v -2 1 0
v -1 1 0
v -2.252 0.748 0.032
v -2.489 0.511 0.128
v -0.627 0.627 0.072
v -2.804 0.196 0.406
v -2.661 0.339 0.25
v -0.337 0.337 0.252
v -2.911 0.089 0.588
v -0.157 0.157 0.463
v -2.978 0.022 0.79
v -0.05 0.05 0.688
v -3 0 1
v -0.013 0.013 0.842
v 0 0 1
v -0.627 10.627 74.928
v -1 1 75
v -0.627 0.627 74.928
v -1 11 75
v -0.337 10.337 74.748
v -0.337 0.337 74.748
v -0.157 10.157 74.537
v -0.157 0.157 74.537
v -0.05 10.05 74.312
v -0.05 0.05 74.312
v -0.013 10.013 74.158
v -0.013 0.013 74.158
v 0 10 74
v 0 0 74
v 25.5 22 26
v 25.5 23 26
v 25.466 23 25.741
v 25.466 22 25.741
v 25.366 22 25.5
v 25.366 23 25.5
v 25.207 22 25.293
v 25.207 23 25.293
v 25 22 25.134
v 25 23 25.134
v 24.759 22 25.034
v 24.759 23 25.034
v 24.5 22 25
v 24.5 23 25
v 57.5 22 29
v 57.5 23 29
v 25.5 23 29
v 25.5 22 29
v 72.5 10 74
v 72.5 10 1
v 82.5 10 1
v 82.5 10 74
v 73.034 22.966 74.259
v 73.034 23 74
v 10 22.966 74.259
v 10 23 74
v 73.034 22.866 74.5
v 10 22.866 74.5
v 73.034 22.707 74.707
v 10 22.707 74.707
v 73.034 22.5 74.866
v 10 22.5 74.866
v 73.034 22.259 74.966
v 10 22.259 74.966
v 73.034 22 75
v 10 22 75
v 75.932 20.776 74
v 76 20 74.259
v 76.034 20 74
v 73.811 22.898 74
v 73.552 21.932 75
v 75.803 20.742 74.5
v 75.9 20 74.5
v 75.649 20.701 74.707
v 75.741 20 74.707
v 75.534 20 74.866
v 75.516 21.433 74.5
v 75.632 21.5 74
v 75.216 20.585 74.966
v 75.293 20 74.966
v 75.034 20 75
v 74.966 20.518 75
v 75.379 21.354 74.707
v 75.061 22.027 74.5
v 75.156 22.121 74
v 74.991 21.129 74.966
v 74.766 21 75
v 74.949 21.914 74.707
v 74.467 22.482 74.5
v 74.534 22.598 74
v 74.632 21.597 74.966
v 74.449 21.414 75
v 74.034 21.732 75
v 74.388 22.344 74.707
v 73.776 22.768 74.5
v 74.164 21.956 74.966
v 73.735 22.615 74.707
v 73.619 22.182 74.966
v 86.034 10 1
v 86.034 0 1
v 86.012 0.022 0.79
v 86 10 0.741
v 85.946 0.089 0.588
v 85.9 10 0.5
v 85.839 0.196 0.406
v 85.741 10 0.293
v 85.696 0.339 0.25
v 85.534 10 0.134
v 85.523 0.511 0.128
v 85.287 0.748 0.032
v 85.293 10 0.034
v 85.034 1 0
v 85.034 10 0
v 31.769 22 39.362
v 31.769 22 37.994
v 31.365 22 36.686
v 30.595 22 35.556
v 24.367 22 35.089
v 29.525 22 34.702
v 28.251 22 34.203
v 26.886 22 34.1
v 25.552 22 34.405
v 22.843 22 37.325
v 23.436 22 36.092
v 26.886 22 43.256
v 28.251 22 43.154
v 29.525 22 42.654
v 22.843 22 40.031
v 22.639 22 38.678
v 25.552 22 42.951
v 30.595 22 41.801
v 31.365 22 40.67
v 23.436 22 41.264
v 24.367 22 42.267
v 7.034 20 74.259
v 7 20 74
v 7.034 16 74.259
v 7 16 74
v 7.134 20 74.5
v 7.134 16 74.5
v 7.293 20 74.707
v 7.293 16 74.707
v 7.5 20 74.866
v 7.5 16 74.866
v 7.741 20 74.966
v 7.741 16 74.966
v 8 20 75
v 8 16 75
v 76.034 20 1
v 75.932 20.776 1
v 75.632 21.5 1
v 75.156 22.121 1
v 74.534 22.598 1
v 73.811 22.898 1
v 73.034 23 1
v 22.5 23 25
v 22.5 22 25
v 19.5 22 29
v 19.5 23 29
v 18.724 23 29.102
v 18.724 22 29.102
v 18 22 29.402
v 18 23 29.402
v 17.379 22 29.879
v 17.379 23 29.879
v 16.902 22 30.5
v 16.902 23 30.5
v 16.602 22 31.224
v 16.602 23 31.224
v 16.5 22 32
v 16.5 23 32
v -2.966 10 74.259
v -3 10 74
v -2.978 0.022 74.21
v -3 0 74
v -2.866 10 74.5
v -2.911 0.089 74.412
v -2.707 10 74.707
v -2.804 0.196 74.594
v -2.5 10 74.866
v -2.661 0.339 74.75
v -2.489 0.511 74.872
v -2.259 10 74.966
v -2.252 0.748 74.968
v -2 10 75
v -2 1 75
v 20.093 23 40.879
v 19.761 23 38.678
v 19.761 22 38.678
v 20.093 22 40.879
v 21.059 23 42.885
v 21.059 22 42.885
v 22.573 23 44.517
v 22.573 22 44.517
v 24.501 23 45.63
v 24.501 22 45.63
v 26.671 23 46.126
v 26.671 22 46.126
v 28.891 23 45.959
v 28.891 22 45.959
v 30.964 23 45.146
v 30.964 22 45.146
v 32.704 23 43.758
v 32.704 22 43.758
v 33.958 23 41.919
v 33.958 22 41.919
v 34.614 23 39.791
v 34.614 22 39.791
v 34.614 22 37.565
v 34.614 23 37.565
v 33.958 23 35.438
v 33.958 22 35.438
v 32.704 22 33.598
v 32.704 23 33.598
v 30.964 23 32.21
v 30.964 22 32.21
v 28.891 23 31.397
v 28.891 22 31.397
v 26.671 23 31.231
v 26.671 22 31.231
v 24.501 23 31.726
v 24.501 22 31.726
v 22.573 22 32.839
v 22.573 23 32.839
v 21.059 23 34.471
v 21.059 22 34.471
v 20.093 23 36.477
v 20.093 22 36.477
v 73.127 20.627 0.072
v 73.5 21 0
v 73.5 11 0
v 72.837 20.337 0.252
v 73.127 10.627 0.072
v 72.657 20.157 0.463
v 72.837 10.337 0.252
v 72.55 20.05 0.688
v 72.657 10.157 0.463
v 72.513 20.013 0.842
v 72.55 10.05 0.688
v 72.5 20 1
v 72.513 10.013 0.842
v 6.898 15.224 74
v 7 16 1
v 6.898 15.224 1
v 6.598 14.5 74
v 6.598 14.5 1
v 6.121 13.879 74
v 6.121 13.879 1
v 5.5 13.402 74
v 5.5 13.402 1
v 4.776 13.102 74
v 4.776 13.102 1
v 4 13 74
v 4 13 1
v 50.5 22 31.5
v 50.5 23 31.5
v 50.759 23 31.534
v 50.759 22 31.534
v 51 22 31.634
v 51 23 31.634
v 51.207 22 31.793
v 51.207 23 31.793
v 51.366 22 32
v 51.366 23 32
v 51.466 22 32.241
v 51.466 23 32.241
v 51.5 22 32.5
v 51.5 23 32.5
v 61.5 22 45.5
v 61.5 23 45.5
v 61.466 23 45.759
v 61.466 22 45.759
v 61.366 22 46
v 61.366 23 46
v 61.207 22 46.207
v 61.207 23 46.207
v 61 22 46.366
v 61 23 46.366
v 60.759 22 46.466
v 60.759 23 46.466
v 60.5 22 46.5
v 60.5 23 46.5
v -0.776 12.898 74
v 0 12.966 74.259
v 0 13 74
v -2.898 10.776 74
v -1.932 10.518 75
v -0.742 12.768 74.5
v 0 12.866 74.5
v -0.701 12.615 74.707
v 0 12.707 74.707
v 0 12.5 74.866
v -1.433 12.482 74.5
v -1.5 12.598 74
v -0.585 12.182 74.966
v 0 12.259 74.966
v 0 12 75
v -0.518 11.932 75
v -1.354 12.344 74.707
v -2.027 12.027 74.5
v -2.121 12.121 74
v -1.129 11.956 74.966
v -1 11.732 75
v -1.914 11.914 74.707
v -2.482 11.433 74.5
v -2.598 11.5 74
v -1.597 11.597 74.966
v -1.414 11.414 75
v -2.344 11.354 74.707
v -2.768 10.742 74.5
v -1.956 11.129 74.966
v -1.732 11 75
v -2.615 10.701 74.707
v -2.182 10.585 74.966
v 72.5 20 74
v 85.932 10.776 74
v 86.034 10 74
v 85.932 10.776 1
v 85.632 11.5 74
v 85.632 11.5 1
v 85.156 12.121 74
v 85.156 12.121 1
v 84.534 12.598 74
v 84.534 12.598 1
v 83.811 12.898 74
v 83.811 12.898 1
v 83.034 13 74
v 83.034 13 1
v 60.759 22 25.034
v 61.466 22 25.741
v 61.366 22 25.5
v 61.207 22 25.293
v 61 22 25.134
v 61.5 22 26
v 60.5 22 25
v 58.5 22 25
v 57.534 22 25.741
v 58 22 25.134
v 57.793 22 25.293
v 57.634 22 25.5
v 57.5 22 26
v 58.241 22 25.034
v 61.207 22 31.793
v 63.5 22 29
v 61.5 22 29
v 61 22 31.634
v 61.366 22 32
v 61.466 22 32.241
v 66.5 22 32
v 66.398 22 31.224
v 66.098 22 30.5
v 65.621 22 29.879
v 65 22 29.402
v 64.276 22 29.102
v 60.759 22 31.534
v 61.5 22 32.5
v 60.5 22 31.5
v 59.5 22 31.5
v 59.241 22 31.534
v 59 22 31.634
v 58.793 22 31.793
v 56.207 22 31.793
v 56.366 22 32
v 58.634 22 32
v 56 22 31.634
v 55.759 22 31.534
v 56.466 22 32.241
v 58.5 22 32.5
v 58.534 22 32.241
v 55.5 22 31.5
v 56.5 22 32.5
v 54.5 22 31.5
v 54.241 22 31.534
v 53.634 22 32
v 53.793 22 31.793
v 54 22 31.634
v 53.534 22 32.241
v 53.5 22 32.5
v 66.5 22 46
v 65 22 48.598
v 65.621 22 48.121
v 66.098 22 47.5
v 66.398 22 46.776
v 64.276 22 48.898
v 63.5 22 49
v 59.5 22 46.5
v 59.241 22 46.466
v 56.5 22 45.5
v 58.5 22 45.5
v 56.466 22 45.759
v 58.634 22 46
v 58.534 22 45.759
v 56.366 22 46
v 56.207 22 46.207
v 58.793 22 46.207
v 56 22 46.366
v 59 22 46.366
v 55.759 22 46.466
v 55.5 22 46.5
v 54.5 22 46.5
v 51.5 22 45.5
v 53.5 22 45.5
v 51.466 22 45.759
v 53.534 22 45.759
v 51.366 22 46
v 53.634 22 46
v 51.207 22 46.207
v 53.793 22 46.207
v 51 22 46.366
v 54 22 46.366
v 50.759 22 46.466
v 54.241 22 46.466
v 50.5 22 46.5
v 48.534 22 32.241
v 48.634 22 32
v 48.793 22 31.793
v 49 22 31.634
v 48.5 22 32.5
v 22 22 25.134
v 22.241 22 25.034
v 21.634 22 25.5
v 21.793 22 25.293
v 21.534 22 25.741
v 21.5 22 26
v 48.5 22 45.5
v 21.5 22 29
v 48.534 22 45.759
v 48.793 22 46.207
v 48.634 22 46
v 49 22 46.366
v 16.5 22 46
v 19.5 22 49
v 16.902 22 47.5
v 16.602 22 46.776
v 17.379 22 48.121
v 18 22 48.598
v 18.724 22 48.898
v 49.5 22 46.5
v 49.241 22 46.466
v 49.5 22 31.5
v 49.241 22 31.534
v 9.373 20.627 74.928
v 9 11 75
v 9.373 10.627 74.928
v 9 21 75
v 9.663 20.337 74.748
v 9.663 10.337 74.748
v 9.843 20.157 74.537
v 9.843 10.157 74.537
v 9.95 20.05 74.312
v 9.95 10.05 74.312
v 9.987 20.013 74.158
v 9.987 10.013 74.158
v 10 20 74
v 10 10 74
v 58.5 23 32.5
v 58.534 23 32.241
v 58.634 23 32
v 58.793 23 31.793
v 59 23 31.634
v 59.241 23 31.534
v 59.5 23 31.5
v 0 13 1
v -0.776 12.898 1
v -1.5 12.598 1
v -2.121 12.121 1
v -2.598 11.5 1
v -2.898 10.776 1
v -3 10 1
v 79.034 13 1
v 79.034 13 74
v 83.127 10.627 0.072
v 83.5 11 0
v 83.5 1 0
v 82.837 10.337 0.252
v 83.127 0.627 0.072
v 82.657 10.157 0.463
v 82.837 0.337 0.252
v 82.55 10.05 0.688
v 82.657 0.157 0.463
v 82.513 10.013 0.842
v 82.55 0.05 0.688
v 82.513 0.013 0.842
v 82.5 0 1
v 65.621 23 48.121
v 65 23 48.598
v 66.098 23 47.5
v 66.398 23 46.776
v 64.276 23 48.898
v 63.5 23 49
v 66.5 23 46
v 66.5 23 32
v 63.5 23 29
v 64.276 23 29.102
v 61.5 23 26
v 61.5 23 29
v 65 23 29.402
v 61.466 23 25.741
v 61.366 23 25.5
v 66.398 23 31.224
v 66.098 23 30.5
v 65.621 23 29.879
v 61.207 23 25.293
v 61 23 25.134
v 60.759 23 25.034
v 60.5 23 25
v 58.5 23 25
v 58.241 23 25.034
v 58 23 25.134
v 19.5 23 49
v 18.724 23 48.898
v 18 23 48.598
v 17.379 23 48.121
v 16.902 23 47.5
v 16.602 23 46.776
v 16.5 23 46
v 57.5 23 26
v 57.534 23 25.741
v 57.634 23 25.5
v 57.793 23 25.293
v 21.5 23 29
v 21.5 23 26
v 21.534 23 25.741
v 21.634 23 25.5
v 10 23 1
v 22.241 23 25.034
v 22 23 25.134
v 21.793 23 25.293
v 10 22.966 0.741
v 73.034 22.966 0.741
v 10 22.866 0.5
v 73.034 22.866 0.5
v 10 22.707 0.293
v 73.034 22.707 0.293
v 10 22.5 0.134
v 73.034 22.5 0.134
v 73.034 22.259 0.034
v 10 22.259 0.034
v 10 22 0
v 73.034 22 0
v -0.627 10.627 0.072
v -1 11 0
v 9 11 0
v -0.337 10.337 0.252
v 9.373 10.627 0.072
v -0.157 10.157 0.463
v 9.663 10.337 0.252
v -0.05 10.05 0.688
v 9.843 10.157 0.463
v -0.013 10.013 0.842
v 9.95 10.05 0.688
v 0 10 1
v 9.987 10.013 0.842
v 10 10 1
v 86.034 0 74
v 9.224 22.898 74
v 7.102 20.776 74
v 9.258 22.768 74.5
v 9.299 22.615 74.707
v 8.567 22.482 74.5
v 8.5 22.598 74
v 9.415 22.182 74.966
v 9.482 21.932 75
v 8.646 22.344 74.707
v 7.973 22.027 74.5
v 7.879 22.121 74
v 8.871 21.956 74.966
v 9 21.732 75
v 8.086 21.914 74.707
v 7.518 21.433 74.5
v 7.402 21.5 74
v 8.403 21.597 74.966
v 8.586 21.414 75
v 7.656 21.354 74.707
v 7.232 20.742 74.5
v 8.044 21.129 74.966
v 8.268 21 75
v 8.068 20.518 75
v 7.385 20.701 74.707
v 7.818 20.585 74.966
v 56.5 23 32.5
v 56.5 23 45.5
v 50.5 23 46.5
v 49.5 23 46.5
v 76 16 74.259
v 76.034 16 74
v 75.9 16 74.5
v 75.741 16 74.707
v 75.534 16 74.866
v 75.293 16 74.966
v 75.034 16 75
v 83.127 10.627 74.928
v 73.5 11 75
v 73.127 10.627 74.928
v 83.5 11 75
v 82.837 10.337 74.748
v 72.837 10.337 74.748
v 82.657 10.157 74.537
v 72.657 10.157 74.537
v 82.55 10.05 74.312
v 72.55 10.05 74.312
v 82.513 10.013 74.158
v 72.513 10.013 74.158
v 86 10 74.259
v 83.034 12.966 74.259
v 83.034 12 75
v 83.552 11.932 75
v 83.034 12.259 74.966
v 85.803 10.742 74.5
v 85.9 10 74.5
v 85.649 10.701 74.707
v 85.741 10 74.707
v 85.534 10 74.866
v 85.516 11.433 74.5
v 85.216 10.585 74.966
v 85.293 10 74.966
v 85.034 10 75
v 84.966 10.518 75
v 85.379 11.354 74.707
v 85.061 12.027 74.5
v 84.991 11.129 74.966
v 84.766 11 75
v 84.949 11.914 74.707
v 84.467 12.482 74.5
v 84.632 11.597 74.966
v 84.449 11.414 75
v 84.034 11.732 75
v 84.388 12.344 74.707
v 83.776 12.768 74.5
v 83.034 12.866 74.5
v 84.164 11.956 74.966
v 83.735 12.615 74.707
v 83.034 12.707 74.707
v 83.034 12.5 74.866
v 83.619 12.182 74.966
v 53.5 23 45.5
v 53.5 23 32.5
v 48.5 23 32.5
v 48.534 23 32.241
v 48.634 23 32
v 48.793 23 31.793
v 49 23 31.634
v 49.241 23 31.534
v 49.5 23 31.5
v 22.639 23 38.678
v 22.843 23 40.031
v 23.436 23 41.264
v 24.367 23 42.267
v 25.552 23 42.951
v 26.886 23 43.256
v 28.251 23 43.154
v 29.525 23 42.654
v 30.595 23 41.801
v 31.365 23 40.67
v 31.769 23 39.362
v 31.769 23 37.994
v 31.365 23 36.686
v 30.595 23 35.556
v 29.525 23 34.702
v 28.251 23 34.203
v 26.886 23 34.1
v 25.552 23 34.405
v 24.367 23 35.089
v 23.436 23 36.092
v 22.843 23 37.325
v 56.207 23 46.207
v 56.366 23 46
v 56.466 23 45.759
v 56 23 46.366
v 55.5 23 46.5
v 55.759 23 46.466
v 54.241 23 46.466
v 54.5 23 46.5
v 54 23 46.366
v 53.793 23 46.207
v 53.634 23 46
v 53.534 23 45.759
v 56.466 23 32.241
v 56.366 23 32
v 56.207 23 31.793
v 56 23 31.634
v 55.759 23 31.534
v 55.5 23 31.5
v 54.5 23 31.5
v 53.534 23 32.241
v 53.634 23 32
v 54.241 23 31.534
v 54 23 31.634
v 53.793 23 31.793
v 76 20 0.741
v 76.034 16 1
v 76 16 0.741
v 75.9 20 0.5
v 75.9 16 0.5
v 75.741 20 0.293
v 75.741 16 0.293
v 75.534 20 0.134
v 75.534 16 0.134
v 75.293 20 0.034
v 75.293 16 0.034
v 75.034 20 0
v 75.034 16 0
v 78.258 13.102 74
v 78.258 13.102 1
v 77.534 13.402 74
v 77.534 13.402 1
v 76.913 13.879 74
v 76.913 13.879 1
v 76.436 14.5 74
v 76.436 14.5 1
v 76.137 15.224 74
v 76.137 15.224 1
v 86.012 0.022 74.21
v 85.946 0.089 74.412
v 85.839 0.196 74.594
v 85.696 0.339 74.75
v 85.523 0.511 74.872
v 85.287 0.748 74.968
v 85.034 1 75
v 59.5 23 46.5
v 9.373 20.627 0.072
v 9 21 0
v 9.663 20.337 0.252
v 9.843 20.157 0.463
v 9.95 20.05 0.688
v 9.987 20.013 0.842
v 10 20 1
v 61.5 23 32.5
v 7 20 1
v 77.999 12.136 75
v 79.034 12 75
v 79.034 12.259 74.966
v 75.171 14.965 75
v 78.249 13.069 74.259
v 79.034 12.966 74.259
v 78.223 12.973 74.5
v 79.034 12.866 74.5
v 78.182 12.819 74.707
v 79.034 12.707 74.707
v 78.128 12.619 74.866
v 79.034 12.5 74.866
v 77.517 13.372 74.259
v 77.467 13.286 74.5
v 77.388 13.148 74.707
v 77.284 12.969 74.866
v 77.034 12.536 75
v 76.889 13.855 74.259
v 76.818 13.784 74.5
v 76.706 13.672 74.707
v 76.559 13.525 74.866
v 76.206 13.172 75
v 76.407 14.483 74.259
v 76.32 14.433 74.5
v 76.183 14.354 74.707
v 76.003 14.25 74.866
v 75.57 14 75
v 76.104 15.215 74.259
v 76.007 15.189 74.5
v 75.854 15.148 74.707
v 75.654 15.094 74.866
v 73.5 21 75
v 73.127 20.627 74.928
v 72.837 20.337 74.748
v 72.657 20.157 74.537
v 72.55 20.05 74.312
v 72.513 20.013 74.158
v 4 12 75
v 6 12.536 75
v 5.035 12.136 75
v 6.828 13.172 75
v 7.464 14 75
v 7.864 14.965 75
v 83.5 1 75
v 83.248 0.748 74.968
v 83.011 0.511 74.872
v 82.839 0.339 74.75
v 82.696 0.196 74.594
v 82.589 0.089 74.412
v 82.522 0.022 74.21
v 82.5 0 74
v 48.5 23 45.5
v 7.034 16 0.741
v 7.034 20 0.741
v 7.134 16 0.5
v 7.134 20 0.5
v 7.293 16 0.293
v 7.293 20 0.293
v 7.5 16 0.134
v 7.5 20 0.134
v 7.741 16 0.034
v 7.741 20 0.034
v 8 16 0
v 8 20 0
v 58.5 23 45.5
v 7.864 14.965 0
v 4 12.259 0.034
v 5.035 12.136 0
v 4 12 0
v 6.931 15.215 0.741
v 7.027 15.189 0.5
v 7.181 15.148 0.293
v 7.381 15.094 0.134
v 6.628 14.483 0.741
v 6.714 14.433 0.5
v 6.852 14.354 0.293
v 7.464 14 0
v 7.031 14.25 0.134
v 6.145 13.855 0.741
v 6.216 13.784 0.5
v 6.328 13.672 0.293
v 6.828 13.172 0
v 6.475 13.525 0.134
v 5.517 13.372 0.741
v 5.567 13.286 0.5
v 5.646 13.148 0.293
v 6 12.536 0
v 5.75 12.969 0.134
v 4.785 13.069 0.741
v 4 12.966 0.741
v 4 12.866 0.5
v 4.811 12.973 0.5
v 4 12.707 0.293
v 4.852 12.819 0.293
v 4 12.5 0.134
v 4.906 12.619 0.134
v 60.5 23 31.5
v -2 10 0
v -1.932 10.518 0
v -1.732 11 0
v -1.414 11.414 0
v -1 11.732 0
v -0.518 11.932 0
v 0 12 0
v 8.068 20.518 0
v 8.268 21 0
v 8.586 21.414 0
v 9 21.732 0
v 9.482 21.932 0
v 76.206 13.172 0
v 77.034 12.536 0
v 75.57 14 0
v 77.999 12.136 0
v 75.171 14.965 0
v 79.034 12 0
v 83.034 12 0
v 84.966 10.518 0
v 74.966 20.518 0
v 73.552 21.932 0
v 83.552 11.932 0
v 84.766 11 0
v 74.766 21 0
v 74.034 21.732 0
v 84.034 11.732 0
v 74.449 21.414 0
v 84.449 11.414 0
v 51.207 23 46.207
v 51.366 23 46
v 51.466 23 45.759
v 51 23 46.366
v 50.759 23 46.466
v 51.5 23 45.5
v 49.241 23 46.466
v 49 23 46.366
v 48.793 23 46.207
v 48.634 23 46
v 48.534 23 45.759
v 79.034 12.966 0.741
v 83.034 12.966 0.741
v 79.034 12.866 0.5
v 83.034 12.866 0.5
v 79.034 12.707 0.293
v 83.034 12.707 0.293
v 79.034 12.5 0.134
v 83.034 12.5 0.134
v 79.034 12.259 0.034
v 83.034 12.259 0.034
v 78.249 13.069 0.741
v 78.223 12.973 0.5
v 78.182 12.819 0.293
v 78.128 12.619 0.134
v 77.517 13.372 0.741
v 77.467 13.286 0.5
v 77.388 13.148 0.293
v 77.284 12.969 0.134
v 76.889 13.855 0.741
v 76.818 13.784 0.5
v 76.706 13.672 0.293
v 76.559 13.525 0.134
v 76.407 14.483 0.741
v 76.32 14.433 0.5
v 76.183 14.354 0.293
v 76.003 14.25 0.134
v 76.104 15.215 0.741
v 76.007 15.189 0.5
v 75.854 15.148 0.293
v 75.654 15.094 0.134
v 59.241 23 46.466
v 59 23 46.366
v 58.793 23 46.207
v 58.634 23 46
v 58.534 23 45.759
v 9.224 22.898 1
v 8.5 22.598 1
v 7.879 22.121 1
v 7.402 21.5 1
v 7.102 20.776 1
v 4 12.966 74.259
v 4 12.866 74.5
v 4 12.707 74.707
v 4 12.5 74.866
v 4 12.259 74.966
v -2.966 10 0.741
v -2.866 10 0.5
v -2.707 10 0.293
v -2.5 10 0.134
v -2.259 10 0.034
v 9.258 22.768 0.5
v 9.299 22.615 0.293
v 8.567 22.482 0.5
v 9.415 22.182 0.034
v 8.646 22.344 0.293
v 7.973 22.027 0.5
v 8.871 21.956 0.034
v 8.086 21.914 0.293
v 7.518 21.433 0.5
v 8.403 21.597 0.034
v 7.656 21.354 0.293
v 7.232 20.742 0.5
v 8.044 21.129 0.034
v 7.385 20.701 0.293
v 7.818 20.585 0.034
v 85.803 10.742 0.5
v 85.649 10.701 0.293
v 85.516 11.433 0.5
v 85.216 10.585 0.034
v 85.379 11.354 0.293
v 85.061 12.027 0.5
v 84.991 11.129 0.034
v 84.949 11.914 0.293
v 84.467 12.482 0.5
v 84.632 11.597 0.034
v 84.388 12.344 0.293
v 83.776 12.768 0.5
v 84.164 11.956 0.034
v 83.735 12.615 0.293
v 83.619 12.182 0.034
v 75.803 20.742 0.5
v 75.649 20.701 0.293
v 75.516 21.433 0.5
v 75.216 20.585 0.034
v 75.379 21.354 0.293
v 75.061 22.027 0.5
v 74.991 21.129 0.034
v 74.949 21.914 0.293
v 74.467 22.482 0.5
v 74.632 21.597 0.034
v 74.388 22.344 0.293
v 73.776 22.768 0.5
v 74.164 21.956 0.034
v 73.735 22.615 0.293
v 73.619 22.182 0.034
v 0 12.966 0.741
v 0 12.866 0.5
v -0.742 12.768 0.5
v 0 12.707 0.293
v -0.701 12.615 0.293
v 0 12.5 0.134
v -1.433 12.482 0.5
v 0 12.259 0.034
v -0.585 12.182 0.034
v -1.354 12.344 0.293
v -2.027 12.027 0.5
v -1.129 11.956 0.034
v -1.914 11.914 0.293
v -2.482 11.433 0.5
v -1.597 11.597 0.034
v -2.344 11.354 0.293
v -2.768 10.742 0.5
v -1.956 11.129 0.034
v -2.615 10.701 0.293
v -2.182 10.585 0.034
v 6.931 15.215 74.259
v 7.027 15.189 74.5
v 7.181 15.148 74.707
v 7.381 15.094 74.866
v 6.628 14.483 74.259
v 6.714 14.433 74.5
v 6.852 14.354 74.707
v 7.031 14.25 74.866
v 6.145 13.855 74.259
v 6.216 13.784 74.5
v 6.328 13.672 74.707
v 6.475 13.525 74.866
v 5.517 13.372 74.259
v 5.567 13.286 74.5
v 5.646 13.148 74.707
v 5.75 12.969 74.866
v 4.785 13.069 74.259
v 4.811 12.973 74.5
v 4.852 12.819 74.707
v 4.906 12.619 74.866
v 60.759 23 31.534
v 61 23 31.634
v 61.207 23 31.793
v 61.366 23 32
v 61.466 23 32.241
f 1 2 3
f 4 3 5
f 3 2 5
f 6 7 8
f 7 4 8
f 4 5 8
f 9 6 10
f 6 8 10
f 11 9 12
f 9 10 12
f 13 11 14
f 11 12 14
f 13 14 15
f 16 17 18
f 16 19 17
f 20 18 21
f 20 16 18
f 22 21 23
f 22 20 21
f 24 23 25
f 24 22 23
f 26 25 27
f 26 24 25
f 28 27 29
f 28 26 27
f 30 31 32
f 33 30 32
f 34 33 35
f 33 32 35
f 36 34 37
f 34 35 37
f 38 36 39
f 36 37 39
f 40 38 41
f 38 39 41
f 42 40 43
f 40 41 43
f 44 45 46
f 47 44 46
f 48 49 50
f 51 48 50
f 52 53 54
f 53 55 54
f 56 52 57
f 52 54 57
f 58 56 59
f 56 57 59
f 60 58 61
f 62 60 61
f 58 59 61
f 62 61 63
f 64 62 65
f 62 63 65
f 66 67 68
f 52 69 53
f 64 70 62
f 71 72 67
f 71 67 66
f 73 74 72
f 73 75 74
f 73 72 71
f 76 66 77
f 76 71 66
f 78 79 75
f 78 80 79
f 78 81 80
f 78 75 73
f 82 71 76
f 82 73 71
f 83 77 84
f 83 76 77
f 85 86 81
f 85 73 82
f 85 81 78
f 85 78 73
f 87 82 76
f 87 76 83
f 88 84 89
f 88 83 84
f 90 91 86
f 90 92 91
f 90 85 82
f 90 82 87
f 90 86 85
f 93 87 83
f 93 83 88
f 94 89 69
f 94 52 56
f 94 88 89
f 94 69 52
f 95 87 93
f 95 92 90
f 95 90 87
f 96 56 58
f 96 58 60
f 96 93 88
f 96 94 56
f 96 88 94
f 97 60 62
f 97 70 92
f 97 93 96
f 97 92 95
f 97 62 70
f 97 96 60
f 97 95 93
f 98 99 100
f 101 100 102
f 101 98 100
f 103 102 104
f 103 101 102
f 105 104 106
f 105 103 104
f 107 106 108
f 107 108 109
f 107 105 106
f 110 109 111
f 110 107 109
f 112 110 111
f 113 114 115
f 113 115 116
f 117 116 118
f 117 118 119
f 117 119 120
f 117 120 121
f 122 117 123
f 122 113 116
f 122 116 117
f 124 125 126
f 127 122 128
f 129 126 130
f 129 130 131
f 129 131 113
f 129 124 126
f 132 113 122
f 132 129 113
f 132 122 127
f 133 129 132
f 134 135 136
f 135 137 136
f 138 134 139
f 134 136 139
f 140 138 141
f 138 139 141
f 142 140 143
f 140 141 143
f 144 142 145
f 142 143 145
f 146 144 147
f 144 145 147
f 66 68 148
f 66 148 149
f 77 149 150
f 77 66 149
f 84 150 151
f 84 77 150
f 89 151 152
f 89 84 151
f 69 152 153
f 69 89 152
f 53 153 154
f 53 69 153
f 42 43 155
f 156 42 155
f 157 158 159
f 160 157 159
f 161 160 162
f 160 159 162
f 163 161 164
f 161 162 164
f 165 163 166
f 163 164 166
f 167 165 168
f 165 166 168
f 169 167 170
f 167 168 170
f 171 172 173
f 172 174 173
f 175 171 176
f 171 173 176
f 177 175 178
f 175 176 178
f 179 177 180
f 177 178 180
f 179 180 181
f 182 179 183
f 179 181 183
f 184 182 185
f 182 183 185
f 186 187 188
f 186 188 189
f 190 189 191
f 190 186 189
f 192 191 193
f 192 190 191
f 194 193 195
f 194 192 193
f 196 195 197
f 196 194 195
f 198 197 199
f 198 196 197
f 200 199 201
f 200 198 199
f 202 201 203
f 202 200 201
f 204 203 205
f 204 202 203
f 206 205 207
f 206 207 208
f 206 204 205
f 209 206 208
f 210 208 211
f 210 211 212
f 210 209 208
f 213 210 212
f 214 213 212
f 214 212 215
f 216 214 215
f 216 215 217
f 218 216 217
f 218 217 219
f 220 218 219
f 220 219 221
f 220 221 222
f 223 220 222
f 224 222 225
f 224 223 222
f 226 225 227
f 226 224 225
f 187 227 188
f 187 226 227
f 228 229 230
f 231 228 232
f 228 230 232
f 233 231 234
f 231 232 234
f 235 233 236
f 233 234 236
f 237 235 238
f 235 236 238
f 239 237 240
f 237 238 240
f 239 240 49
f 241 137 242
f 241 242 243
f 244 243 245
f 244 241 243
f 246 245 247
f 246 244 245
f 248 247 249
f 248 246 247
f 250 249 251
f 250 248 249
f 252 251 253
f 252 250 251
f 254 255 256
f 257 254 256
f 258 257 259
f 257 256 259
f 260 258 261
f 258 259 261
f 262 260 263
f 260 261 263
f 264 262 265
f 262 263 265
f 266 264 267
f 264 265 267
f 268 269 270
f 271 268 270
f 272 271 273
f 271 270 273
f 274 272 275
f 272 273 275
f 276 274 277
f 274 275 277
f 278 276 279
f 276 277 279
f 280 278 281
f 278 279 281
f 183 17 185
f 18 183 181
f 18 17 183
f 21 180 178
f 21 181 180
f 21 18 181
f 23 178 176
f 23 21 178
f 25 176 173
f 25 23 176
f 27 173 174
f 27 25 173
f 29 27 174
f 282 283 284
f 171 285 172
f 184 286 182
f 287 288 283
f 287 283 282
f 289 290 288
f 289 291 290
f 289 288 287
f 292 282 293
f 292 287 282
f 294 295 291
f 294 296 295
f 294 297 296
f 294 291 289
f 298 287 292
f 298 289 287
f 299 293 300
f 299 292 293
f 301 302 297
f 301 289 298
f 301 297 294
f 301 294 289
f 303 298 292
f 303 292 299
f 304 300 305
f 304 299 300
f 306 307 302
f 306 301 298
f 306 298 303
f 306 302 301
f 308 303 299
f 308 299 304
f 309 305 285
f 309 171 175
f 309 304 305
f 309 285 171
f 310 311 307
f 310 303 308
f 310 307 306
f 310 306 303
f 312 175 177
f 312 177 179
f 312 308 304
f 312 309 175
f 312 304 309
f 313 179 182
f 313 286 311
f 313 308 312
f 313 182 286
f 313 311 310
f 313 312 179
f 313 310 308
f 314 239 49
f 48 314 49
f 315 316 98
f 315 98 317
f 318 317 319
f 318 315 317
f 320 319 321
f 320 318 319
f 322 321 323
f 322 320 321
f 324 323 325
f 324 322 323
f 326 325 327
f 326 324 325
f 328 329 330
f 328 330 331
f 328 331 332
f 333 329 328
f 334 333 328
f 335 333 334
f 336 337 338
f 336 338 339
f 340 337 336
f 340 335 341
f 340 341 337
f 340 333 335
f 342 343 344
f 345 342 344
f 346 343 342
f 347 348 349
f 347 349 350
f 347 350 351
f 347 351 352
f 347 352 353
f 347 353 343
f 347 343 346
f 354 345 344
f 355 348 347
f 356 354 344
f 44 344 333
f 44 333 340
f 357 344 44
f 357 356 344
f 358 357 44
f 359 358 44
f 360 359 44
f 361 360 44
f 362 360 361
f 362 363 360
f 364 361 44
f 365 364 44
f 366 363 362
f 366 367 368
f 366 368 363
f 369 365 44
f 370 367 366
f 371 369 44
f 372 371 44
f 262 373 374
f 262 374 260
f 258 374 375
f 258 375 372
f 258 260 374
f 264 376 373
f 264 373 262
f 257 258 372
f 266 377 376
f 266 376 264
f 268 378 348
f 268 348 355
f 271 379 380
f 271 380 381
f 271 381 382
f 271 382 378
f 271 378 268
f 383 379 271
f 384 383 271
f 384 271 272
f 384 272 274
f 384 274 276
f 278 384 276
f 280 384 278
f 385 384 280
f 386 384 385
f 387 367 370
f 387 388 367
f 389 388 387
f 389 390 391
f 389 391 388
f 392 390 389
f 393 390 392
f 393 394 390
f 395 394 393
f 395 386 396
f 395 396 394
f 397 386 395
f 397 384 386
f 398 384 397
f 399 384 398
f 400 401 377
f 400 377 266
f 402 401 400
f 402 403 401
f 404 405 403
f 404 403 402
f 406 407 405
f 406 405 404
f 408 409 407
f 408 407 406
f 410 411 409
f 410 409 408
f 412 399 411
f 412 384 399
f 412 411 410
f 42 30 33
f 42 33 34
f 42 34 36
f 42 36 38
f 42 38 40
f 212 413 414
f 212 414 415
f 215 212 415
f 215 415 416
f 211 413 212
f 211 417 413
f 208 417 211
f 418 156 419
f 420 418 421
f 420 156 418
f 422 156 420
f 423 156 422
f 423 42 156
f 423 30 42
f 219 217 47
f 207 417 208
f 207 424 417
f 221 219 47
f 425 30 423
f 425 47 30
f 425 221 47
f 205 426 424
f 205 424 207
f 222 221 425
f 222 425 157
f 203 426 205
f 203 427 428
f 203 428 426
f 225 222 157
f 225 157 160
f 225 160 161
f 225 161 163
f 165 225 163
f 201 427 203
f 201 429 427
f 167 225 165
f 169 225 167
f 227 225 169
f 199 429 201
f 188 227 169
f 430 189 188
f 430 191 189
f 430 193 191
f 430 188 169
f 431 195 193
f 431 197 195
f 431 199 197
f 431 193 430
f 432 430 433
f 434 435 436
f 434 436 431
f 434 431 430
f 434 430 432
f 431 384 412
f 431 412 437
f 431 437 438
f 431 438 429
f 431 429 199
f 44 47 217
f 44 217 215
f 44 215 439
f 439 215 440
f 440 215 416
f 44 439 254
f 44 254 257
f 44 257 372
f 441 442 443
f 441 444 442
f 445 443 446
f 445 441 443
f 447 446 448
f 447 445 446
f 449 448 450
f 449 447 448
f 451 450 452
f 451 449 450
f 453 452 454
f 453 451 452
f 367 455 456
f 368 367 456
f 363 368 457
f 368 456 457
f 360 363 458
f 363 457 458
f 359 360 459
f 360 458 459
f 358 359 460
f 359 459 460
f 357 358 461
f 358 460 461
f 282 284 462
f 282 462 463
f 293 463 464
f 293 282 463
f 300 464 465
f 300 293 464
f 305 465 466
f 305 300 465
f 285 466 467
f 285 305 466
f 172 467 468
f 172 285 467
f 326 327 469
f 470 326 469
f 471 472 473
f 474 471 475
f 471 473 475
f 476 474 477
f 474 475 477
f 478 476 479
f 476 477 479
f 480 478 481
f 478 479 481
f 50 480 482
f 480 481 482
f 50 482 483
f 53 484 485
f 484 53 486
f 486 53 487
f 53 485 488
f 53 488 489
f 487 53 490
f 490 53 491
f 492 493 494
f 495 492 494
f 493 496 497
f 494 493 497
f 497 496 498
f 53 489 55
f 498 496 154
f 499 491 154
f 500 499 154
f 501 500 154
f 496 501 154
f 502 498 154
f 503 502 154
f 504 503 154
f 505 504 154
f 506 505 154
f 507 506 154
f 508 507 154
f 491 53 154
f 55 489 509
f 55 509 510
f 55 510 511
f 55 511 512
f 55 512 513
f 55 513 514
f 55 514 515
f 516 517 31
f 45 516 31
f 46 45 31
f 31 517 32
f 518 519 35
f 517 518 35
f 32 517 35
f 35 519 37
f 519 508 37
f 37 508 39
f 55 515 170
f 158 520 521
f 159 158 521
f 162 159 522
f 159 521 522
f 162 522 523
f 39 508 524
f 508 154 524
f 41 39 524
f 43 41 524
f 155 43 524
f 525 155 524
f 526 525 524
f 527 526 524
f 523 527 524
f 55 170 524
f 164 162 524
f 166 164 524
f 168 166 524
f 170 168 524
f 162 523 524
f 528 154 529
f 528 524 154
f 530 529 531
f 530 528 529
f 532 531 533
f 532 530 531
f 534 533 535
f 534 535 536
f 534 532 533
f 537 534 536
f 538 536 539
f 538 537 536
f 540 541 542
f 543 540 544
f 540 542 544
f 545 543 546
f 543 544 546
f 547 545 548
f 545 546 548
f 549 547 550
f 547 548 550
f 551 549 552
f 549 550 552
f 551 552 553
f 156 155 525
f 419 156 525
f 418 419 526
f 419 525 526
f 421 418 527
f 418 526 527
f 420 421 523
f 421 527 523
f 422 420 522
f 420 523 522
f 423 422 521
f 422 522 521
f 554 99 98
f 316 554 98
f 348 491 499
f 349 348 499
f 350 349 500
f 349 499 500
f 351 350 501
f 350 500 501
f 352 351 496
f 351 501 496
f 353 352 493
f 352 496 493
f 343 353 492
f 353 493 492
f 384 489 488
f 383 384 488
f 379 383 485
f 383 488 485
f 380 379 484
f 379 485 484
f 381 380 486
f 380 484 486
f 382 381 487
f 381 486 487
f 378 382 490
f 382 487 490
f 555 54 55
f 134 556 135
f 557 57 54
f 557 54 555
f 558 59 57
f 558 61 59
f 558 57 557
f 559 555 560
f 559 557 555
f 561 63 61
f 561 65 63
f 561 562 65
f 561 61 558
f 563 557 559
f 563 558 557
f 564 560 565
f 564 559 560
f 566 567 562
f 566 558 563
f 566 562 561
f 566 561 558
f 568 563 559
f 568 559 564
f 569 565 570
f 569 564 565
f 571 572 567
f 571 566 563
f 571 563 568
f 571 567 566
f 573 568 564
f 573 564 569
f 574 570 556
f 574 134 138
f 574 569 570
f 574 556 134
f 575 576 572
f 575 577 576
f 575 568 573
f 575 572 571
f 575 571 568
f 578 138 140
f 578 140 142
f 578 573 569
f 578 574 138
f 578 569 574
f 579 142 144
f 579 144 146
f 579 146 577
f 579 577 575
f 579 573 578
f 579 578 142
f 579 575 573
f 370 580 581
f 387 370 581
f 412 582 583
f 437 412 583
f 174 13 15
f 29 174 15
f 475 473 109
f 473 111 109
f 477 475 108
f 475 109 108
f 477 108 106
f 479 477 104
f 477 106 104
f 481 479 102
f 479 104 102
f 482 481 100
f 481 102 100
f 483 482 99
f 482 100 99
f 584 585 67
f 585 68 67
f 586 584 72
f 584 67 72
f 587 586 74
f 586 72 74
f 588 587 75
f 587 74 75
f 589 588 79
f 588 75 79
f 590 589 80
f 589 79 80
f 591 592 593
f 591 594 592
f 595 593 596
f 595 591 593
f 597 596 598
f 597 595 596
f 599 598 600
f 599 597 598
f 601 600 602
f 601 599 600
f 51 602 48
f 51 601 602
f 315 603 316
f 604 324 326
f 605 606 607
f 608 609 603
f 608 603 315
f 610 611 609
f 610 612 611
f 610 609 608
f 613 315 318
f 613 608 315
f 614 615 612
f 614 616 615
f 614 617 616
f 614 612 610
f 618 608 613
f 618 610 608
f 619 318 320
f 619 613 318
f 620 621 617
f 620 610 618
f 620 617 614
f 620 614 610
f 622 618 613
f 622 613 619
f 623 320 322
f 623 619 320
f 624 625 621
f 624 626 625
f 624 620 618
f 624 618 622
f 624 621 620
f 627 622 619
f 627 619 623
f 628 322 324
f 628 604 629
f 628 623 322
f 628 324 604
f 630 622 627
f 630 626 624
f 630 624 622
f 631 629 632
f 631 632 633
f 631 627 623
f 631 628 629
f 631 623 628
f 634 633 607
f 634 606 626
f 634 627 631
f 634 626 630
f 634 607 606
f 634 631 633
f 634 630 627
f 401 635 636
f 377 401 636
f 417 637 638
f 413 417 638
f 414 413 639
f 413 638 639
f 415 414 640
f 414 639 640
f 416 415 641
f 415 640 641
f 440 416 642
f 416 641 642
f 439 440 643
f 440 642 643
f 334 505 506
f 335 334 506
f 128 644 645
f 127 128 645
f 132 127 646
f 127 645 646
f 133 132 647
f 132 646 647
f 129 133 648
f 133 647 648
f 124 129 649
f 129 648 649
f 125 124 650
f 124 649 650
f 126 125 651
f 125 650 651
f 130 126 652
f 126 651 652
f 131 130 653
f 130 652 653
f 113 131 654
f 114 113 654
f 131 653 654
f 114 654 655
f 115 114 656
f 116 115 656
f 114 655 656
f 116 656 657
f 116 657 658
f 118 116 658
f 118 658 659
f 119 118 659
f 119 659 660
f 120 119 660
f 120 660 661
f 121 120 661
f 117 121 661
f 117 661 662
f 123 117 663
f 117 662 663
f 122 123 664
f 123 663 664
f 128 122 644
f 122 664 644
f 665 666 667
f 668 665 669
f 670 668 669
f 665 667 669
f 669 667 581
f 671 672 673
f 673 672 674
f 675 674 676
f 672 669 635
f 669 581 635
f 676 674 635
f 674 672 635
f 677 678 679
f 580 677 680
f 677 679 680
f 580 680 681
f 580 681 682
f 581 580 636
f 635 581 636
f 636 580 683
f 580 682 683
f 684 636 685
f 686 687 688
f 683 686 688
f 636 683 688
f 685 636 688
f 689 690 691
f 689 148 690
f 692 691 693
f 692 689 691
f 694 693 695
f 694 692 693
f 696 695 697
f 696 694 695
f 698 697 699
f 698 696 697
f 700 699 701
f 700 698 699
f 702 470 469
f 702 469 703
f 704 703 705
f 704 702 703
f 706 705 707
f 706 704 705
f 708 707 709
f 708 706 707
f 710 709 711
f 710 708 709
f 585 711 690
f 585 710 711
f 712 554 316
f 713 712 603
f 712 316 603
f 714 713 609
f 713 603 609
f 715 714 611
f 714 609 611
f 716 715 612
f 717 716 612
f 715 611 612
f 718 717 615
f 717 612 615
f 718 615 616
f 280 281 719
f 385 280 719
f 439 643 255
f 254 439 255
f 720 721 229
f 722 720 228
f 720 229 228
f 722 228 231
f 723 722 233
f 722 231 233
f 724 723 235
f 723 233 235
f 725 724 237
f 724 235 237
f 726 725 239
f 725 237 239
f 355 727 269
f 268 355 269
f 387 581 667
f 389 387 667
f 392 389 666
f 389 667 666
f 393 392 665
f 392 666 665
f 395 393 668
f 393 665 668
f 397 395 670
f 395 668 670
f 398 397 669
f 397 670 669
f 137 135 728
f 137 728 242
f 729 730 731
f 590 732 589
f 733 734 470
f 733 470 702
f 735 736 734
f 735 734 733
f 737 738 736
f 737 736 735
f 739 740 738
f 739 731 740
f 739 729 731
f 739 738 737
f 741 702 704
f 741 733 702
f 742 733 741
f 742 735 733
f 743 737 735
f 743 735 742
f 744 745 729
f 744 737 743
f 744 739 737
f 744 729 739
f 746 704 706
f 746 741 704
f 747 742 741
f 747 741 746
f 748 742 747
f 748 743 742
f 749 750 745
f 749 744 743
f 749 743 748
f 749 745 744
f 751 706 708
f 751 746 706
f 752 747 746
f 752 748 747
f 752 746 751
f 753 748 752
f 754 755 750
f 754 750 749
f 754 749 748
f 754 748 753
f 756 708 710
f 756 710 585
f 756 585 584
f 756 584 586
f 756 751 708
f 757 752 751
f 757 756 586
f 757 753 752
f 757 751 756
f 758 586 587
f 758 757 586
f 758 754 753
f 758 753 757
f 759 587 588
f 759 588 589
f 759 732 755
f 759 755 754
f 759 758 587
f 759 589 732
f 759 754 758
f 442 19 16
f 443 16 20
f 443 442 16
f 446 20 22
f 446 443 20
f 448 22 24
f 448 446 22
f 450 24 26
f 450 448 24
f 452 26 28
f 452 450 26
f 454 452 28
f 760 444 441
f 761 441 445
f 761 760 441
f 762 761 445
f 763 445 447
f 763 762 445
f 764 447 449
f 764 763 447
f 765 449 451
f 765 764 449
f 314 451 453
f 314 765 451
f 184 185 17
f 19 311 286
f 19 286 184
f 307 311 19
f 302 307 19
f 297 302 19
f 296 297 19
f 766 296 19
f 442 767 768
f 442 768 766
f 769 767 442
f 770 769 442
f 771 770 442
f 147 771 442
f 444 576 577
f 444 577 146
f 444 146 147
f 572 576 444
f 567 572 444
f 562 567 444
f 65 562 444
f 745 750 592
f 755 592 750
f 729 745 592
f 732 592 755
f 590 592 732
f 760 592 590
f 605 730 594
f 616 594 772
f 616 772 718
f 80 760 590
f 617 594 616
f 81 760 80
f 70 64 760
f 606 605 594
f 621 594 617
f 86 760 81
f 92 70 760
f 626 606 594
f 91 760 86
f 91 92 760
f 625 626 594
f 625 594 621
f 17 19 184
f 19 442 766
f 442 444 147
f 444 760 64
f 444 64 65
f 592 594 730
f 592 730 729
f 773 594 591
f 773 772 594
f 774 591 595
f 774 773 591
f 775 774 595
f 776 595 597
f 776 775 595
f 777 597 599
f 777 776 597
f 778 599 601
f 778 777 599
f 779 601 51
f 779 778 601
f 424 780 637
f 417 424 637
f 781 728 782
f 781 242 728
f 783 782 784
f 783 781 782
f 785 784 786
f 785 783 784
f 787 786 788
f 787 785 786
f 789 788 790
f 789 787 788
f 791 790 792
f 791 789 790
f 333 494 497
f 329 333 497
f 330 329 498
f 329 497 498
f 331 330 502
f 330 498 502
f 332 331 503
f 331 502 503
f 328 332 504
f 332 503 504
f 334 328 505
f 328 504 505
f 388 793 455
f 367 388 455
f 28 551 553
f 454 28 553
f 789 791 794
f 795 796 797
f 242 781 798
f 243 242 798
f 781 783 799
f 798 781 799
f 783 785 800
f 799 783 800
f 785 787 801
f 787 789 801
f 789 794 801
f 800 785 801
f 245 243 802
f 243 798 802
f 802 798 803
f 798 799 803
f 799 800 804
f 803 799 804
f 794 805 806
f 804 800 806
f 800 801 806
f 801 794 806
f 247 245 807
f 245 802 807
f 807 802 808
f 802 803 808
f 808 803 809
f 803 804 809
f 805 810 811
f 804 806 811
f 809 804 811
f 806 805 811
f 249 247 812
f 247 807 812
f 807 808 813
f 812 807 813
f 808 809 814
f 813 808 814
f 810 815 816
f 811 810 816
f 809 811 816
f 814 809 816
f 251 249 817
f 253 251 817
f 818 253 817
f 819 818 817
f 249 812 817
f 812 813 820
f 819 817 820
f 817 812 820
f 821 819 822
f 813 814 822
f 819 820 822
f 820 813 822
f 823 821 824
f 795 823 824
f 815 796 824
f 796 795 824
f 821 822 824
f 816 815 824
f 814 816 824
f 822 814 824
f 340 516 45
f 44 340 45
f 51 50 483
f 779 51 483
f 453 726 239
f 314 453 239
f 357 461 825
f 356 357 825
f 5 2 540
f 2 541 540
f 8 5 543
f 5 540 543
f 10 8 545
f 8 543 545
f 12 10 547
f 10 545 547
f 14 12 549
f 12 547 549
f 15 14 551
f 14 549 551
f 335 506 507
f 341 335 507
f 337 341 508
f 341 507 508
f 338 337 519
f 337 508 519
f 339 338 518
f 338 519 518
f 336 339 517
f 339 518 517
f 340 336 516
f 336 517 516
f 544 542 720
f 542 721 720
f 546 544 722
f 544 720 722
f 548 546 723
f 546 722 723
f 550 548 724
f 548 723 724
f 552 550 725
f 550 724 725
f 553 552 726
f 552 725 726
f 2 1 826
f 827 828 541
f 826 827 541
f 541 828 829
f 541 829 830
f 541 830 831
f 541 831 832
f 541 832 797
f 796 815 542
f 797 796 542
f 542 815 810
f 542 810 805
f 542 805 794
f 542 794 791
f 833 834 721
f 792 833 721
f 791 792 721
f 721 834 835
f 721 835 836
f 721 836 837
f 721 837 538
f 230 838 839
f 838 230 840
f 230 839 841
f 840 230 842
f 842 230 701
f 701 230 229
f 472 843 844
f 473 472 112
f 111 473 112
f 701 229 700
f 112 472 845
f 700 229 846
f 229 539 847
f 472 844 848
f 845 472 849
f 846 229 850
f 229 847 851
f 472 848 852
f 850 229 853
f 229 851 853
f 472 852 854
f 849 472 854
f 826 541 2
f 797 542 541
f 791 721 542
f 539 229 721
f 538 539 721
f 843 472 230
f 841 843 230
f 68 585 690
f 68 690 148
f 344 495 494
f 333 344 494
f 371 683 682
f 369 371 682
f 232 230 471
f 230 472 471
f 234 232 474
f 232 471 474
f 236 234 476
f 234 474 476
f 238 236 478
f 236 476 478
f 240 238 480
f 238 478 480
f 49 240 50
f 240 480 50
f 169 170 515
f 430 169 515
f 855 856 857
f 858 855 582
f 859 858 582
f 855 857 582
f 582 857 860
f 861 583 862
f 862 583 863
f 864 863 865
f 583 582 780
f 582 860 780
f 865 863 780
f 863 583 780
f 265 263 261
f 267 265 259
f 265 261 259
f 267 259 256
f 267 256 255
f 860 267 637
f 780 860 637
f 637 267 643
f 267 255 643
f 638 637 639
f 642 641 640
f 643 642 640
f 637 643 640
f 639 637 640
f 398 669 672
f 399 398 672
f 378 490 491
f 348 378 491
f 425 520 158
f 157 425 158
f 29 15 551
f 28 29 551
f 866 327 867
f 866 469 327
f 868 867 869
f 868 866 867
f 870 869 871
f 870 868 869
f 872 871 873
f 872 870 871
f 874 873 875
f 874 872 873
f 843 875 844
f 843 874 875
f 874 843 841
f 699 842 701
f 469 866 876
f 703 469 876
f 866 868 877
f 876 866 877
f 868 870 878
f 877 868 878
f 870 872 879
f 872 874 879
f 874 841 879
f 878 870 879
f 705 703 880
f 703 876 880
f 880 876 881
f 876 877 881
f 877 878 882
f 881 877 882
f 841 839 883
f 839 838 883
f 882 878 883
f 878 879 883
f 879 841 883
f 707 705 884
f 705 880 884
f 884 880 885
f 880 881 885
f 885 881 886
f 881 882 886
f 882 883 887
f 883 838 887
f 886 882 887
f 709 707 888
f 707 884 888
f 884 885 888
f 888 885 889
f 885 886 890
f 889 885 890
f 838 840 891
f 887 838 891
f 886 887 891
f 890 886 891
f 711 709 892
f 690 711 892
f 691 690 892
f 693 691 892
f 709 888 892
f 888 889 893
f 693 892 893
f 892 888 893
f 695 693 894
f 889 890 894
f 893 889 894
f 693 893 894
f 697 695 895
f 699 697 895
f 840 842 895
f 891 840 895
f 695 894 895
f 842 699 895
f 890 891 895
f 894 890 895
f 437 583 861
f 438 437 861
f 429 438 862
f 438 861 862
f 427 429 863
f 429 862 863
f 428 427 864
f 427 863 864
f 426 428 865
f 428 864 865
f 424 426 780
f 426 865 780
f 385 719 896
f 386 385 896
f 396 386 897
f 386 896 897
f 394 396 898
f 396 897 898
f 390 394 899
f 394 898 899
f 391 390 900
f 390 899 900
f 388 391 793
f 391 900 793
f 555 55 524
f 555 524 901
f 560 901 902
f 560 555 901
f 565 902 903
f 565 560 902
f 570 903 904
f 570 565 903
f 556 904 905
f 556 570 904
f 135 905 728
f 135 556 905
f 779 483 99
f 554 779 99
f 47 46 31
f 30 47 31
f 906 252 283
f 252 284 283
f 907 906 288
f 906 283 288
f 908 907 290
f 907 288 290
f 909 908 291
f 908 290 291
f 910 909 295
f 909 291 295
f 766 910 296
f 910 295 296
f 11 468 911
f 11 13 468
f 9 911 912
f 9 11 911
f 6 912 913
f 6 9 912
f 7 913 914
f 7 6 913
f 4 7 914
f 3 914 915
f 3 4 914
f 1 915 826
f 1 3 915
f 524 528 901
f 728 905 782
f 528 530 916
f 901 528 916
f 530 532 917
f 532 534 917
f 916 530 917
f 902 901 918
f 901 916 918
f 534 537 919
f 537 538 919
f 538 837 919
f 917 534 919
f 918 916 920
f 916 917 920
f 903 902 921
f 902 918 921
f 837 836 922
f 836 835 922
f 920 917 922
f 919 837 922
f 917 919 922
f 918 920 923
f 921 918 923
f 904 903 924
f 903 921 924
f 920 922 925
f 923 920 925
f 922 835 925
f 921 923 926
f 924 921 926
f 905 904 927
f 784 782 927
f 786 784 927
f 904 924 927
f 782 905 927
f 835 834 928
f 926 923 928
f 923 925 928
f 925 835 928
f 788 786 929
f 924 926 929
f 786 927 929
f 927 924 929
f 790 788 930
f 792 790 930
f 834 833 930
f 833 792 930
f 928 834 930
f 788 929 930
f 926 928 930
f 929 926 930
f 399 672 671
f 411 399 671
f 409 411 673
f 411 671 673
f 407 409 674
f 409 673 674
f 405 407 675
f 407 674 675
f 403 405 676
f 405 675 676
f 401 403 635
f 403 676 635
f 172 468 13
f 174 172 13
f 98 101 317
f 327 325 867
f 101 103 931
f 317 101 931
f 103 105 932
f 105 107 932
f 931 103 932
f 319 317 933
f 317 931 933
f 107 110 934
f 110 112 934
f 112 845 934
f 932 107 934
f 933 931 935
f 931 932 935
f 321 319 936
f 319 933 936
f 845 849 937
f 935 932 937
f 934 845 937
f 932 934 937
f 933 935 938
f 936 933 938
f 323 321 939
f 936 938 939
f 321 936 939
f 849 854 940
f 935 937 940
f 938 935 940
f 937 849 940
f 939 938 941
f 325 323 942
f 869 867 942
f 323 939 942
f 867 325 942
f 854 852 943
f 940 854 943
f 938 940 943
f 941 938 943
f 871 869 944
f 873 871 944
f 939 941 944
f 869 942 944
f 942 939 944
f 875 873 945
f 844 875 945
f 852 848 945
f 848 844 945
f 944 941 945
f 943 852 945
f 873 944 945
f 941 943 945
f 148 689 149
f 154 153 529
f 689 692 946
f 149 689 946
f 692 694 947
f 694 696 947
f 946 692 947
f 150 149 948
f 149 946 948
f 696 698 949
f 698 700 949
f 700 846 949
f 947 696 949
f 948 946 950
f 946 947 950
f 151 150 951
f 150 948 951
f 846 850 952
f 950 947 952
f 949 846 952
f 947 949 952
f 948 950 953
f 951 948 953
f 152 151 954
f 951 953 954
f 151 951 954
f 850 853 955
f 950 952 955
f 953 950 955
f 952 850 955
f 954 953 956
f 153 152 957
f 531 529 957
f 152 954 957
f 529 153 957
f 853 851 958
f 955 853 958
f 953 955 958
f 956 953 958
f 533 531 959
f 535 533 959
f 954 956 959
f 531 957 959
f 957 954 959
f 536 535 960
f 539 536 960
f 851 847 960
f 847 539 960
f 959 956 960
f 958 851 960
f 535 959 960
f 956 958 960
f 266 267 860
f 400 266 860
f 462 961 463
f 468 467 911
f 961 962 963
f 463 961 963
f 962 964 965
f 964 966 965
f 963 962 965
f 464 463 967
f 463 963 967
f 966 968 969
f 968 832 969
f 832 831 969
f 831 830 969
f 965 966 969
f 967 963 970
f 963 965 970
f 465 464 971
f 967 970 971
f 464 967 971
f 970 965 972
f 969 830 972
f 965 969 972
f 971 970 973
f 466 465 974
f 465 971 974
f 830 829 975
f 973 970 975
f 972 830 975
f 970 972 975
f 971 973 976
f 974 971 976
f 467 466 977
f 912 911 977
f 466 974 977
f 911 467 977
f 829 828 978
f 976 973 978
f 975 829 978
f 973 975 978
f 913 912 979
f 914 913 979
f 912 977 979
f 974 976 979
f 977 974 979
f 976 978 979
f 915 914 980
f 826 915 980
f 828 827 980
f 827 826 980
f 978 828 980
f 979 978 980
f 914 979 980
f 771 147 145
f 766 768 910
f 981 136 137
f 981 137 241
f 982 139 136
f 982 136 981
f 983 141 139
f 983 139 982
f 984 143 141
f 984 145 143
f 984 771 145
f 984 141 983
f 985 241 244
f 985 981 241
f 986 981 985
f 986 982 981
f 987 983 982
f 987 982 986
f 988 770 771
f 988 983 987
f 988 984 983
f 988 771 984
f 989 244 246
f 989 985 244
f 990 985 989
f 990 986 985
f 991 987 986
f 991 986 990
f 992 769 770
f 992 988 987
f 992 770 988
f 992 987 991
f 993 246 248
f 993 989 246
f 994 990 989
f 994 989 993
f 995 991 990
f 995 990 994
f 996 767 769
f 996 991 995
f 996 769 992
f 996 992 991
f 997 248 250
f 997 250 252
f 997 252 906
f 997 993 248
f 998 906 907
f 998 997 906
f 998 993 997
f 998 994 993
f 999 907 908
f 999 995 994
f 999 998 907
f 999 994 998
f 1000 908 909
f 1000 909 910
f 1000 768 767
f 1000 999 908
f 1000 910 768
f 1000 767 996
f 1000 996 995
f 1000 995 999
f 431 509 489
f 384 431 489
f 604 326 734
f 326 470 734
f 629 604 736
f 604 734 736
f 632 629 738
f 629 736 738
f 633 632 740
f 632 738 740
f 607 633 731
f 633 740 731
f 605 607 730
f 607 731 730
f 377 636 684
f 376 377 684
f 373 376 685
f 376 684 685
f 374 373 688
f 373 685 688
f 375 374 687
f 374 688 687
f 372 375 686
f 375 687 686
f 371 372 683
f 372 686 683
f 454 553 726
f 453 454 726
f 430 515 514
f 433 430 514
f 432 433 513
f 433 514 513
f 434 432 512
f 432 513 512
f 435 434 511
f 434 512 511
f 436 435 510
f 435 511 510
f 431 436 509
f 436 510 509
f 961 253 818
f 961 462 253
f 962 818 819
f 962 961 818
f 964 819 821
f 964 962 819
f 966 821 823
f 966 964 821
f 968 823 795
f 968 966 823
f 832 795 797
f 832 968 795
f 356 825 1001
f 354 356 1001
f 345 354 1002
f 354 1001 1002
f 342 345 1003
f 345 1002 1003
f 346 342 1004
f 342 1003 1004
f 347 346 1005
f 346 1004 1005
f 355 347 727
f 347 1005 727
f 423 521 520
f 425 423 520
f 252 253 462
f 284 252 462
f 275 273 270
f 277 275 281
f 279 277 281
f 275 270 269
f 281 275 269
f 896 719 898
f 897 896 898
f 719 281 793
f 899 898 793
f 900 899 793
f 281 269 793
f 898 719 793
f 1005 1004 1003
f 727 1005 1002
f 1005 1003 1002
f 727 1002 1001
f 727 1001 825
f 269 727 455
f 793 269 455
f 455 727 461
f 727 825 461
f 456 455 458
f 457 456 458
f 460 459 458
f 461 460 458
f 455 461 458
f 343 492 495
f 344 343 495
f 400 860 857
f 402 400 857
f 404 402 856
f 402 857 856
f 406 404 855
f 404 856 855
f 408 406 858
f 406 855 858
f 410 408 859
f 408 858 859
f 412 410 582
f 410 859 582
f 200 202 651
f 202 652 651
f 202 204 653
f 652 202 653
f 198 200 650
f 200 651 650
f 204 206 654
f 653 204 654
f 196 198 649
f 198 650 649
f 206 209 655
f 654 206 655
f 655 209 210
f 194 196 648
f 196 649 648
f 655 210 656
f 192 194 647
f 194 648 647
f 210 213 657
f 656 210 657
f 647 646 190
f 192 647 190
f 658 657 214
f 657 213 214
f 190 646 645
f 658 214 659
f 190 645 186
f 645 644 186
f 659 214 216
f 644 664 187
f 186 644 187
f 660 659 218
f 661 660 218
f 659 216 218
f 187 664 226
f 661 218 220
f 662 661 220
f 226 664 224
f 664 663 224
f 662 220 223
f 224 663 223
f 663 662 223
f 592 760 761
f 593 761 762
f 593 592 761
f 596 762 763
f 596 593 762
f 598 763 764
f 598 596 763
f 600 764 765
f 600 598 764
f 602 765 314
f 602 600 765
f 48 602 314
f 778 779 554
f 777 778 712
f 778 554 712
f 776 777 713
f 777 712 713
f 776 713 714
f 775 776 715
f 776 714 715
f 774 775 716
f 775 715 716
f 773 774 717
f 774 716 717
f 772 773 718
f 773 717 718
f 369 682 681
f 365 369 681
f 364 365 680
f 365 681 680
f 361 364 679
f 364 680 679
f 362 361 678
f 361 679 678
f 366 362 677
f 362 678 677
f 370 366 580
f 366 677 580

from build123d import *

# Parameters (mm, degrees)
F1_DEPTH = 75
F2_R     = 3
F3_R     = 1
F4_R     = 7.468486
F4_R_2   = 4.590702
F5_DEPTH = 1


with BuildPart() as f1:
    # F0 (on Top) → F1 (new body)
    with BuildSketch(Plane.XY):
        Polygon((-3, 0), (0, 0), (0, 10), (10, 10), (10, 20), (72.5, 20), (72.5, 10), (82.5, 10), (82.5, 0), (86.034332, 0), (86.034332, 13), (76.034332, 13), (76.034332, 23), (7, 23), (7, 13), (-3, 13), align=None)
    extrude(amount=F1_DEPTH)

    # F2
    f2_edges = [f1.edges().sort_by_distance(p)[0] for p in [
        (-3, 13, 37.5),
        (7, 13, 37.5),
        (7, 23, 37.5),
        (76.034332, 23, 37.5),
        (76.034332, 13, 37.5),
        (86.034332, 13, 37.5),
    ]]
    fillet(f2_edges, radius=F2_R)

    # F3
    f3_edges = [f1.edges().sort_by_distance(p)[0] for p in [
        (86.034332, 5, 75),
        (85.155653, 12.12132, 75),
        (84.267166, 0, 75),
        (81.034332, 13, 75),
        (82.5, 5, 75),
        (76.913012, 13.87868, 75),
        (77.5, 10, 75),
        (76.034332, 18, 75),
        (72.5, 15, 75),
        (75.155653, 22.12132, 75),
        (41.25, 20, 75),
        (41.517166, 23, 75),
        (10, 15, 75),
        (7.87868, 22.12132, 75),
        (5, 10, 75),
        (7, 18, 75),
        (0, 5, 75),
        (6.12132, 13.87868, 75),
        (-1.5, 0, 75),
        (2, 13, 75),
        (-3, 5, 75),
        (-2.12132, 12.12132, 75),
        (86.034332, 5, 0),
        (85.155653, 12.12132, 0),
        (84.267166, 0, 0),
        (81.034332, 13, 0),
        (82.5, 5, 0),
        (76.913012, 13.87868, 0),
        (77.5, 10, 0),
        (76.034332, 18, 0),
        (72.5, 15, 0),
        (75.155653, 22.12132, 0),
        (41.25, 20, 0),
        (41.517166, 23, 0),
        (10, 15, 0),
        (7.87868, 22.12132, 0),
        (5, 10, 0),
        (7, 18, 0),
        (0, 5, 0),
        (6.12132, 13.87868, 0),
        (-1.5, 0, 0),
        (2, 13, 0),
        (-3, 5, 0),
        (-2.12132, 12.12132, 0),
    ]]
    fillet(f3_edges, radius=F3_R)

    # F4 (on face) → F5 (cut)
    with BuildSketch(Plane(origin=(0, 23, 0), x_dir=(-1, 0, 0), z_dir=(0, 1, 0))):
        with BuildLine():
            Line((-19.5, 49), (-63.5, 49))
            ThreePointArc((-63.5, 49), (-65.62132, 48.12132), (-66.5, 46))
            Line((-66.5, 46), (-66.5, 32))
            ThreePointArc((-66.5, 32), (-65.62132, 29.87868), (-63.5, 29))
            Line((-63.5, 29), (-61.5, 29))
            Line((-61.5, 29), (-61.5, 26))
            ThreePointArc((-61.5, 26), (-61.207107, 25.292893), (-60.5, 25))
            Line((-60.5, 25), (-58.5, 25))
            ThreePointArc((-58.5, 25), (-57.792893, 25.292893), (-57.5, 26))
            Line((-57.5, 26), (-57.5, 29))
            Line((-57.5, 29), (-25.5, 29))
            Line((-25.5, 29), (-25.5, 26))
            ThreePointArc((-25.5, 26), (-25.207107, 25.292893), (-24.5, 25))
            Line((-24.5, 25), (-22.5, 25))
            ThreePointArc((-22.5, 25), (-21.792893, 25.292893), (-21.5, 26))
            Line((-21.5, 26), (-21.5, 29))
            Line((-21.5, 29), (-19.5, 29))
            ThreePointArc((-19.5, 29), (-17.37868, 29.87868), (-16.5, 32))
            Line((-16.5, 32), (-16.5, 46))
            ThreePointArc((-16.5, 46), (-17.37868, 48.12132), (-19.5, 49))
        make_face()
        with BuildLine():
            ThreePointArc((-61.5, 45.5), (-61.207107, 46.207107), (-60.5, 46.5))
            Line((-60.5, 46.5), (-59.5, 46.5))
            ThreePointArc((-59.5, 46.5), (-58.792893, 46.207107), (-58.5, 45.5))
            Line((-58.5, 45.5), (-58.5, 32.5))
            ThreePointArc((-58.5, 32.5), (-58.792893, 31.792893), (-59.5, 31.5))
            Line((-59.5, 31.5), (-60.5, 31.5))
            ThreePointArc((-60.5, 31.5), (-61.207107, 31.792893), (-61.5, 32.5))
            Line((-61.5, 32.5), (-61.5, 45.5))
        make_face(mode=Mode.SUBTRACT)
        with BuildLine():
            ThreePointArc((-56.5, 45.5), (-56.207107, 46.207107), (-55.5, 46.5))
            Line((-55.5, 46.5), (-54.5, 46.5))
            ThreePointArc((-54.5, 46.5), (-53.792893, 46.207107), (-53.5, 45.5))
            Line((-53.5, 45.5), (-53.5, 32.5))
            ThreePointArc((-53.5, 32.5), (-53.792893, 31.792893), (-54.5, 31.5))
            Line((-54.5, 31.5), (-55.5, 31.5))
            ThreePointArc((-55.5, 31.5), (-56.207107, 31.792893), (-56.5, 32.5))
            Line((-56.5, 32.5), (-56.5, 45.5))
        make_face(mode=Mode.SUBTRACT)
        with BuildLine():
            ThreePointArc((-51.5, 45.5), (-51.207107, 46.207107), (-50.5, 46.5))
            Line((-50.5, 46.5), (-49.5, 46.5))
            ThreePointArc((-49.5, 46.5), (-48.792893, 46.207107), (-48.5, 45.5))
            Line((-48.5, 45.5), (-48.5, 32.5))
            ThreePointArc((-48.5, 32.5), (-48.792893, 31.792893), (-49.5, 31.5))
            Line((-49.5, 31.5), (-50.5, 31.5))
            ThreePointArc((-50.5, 31.5), (-51.207107, 31.792893), (-51.5, 32.5))
            Line((-51.5, 32.5), (-51.5, 45.5))
        make_face(mode=Mode.SUBTRACT)
        with Locations((-27.229397, 38.67811)):
            Circle(F4_R, mode=Mode.SUBTRACT)
        with Locations((-27.229397, 38.67811)):
            Circle(F4_R_2)
    extrude(amount=-F5_DEPTH, mode=Mode.SUBTRACT)


solid = f1.part
